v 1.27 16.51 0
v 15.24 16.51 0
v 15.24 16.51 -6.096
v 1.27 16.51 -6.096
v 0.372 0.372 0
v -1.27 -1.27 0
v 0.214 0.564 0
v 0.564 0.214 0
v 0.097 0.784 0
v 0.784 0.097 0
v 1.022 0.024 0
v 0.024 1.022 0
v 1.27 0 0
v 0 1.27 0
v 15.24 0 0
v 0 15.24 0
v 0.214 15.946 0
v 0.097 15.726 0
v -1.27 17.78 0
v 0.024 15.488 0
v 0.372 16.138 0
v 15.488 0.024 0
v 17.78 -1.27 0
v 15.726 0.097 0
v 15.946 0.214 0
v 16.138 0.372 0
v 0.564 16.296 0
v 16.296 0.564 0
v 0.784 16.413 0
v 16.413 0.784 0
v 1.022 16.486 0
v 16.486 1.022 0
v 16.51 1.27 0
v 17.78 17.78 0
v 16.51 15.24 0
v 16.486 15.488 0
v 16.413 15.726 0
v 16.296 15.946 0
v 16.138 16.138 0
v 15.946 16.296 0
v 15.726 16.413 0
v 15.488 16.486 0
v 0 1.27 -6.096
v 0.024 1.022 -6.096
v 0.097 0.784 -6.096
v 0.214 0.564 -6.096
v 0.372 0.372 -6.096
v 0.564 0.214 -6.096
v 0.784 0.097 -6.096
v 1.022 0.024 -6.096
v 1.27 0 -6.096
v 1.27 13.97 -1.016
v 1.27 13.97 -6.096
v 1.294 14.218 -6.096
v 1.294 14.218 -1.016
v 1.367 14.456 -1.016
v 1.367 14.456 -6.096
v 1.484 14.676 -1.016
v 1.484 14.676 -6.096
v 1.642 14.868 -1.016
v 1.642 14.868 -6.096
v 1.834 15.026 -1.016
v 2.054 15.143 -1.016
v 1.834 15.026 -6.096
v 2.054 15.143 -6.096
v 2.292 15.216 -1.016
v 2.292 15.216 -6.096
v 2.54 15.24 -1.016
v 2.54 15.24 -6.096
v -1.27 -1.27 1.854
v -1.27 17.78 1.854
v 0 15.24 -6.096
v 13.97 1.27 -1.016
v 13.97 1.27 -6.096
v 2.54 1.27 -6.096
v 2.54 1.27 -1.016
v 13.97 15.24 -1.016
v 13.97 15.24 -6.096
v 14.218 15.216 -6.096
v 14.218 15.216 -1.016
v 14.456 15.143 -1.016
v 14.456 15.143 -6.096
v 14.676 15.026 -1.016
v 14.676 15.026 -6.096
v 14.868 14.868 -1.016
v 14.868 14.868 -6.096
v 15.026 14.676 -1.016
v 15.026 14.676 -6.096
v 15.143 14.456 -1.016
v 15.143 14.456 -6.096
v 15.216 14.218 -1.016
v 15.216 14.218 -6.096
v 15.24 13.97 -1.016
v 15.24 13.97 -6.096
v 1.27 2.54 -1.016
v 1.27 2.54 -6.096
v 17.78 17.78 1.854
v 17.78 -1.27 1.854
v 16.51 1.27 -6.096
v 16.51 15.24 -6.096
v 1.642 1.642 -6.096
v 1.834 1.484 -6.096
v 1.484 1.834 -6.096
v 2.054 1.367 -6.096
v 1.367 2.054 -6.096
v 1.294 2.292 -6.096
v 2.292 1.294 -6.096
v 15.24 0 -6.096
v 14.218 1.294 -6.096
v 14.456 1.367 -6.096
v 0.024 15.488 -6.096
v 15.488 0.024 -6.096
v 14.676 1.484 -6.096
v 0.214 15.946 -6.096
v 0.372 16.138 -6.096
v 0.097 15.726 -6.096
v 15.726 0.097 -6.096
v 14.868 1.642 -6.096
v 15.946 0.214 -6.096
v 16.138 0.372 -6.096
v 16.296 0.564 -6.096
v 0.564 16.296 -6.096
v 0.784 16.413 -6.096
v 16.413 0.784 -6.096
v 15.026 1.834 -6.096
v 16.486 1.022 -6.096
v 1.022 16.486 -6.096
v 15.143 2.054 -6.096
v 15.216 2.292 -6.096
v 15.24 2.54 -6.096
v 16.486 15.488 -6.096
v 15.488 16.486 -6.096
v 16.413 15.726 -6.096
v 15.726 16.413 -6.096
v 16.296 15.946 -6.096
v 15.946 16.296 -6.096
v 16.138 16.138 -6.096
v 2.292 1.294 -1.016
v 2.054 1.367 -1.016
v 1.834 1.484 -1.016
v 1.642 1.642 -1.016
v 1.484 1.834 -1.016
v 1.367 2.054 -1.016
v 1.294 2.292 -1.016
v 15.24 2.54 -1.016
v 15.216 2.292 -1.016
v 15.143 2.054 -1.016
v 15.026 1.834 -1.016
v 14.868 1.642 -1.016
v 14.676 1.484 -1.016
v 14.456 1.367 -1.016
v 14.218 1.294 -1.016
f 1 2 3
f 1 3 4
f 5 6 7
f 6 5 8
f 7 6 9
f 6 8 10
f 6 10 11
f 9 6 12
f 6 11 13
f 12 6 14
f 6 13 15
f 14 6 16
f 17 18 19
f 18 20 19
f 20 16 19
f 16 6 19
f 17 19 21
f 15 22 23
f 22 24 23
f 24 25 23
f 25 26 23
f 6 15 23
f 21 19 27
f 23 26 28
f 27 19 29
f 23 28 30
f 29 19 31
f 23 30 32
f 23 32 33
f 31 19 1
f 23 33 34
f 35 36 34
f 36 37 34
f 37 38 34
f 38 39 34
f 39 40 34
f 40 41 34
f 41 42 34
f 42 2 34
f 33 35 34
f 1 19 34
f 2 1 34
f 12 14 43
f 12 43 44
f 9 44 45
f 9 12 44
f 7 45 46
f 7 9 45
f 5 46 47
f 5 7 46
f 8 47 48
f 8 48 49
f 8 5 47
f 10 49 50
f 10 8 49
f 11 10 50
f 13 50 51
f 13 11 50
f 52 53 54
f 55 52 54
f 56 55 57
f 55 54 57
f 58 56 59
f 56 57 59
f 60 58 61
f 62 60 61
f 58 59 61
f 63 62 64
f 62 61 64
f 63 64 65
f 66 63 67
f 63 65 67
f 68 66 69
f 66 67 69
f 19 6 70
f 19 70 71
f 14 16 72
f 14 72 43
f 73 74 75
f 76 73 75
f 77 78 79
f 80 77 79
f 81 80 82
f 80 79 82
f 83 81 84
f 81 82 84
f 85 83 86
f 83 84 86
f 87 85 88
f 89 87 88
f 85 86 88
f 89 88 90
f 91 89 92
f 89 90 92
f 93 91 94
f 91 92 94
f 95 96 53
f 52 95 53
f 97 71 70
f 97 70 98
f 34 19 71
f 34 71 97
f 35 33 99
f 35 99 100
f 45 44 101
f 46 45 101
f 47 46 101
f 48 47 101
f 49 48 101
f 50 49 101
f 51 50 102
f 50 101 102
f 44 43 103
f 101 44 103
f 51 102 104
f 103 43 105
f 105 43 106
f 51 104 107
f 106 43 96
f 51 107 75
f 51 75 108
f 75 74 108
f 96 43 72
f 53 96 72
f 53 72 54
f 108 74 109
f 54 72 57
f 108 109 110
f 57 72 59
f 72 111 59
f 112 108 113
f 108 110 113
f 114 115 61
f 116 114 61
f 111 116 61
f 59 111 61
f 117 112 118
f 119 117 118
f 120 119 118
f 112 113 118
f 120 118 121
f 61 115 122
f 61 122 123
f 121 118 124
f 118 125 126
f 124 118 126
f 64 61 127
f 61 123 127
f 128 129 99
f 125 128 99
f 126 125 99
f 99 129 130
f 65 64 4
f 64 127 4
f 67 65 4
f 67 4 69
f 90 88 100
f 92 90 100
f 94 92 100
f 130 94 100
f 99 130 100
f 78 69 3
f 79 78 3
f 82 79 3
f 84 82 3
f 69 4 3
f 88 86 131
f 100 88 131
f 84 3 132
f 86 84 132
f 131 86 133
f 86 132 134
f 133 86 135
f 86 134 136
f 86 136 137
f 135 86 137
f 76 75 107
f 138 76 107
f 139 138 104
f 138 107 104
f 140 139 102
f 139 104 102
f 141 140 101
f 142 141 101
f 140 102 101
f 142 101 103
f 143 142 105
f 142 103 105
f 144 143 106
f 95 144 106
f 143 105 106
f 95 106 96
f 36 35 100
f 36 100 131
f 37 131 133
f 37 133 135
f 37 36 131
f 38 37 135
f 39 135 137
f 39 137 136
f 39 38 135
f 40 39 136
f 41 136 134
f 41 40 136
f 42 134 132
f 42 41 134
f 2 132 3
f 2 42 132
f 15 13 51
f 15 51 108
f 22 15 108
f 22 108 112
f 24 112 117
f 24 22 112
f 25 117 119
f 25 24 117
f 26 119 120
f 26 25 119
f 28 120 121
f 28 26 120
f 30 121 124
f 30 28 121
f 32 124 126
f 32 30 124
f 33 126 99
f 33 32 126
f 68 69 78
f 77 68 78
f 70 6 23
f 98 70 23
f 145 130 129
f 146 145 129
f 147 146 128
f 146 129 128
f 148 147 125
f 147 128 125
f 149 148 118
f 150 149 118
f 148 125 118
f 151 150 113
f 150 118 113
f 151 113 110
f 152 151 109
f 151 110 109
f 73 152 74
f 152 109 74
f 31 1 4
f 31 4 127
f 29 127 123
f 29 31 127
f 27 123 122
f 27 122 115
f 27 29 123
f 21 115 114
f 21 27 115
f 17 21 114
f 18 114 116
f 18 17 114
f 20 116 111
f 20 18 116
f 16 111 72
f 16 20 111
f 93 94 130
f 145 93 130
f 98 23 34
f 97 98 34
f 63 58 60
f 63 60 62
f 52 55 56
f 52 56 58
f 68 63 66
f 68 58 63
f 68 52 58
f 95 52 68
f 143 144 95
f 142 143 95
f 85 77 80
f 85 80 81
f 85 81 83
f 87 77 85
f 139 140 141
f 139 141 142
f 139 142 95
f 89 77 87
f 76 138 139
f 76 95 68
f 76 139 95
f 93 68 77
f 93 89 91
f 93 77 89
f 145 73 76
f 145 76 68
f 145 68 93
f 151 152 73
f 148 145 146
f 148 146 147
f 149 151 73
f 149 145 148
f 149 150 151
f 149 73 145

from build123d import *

# Parameters (mm, degrees)
F1_DEPTH = 6.096
F3_DEPTH = 5.08
F4_W     = 19.05
F4_H     = 19.05
F5_DEPTH = 1.8542


with BuildPart() as f1:
    # F0 (on Top) → F1 (new body)
    with BuildSketch(Plane.XY):
        with BuildLine():
            ThreePointArc((0, 1.27), (0.371974, 0.371974), (1.27, 0))
            Line((1.27, 0), (15.24, 0))
            ThreePointArc((15.24, 0), (16.138026, 0.371974), (16.51, 1.27))
            Line((16.51, 1.27), (16.51, 15.24))
            ThreePointArc((16.51, 15.24), (16.138026, 16.138026), (15.24, 16.51))
            Line((15.24, 16.51), (1.27, 16.51))
            ThreePointArc((1.27, 16.51), (0.371974, 16.138026), (0, 15.24))
            Line((0, 15.24), (0, 1.27))
        make_face()
    extrude(amount=-F1_DEPTH)

    # F2 (on face) → F3 (cut)
    with BuildSketch(Plane(origin=(0, 0, -6.096), x_dir=(1, 0, 0), z_dir=(0, 0, -1))):
        with BuildLine():
            Line((13.97, -1.27), (2.54, -1.27))
            ThreePointArc((2.54, -1.27), (1.641974, -1.641974), (1.27, -2.54))
            Line((1.27, -2.54), (1.27, -13.97))
            ThreePointArc((1.27, -13.97), (1.641974, -14.868026), (2.54, -15.24))
            Line((2.54, -15.24), (13.97, -15.24))
            ThreePointArc((13.97, -15.24), (14.868026, -14.868026), (15.24, -13.97))
            Line((15.24, -13.97), (15.24, -2.54))
            ThreePointArc((15.24, -2.54), (14.868026, -1.641974), (13.97, -1.27))
        make_face()
    extrude(amount=-F3_DEPTH, mode=Mode.SUBTRACT)

    # F4 (on Top) → F5 (join)
    with BuildSketch(Plane.XY):
        with Locations((8.255, 8.255)):
            Rectangle(F4_W, F4_H)
    extrude(amount=F5_DEPTH)


solid = f1.part
